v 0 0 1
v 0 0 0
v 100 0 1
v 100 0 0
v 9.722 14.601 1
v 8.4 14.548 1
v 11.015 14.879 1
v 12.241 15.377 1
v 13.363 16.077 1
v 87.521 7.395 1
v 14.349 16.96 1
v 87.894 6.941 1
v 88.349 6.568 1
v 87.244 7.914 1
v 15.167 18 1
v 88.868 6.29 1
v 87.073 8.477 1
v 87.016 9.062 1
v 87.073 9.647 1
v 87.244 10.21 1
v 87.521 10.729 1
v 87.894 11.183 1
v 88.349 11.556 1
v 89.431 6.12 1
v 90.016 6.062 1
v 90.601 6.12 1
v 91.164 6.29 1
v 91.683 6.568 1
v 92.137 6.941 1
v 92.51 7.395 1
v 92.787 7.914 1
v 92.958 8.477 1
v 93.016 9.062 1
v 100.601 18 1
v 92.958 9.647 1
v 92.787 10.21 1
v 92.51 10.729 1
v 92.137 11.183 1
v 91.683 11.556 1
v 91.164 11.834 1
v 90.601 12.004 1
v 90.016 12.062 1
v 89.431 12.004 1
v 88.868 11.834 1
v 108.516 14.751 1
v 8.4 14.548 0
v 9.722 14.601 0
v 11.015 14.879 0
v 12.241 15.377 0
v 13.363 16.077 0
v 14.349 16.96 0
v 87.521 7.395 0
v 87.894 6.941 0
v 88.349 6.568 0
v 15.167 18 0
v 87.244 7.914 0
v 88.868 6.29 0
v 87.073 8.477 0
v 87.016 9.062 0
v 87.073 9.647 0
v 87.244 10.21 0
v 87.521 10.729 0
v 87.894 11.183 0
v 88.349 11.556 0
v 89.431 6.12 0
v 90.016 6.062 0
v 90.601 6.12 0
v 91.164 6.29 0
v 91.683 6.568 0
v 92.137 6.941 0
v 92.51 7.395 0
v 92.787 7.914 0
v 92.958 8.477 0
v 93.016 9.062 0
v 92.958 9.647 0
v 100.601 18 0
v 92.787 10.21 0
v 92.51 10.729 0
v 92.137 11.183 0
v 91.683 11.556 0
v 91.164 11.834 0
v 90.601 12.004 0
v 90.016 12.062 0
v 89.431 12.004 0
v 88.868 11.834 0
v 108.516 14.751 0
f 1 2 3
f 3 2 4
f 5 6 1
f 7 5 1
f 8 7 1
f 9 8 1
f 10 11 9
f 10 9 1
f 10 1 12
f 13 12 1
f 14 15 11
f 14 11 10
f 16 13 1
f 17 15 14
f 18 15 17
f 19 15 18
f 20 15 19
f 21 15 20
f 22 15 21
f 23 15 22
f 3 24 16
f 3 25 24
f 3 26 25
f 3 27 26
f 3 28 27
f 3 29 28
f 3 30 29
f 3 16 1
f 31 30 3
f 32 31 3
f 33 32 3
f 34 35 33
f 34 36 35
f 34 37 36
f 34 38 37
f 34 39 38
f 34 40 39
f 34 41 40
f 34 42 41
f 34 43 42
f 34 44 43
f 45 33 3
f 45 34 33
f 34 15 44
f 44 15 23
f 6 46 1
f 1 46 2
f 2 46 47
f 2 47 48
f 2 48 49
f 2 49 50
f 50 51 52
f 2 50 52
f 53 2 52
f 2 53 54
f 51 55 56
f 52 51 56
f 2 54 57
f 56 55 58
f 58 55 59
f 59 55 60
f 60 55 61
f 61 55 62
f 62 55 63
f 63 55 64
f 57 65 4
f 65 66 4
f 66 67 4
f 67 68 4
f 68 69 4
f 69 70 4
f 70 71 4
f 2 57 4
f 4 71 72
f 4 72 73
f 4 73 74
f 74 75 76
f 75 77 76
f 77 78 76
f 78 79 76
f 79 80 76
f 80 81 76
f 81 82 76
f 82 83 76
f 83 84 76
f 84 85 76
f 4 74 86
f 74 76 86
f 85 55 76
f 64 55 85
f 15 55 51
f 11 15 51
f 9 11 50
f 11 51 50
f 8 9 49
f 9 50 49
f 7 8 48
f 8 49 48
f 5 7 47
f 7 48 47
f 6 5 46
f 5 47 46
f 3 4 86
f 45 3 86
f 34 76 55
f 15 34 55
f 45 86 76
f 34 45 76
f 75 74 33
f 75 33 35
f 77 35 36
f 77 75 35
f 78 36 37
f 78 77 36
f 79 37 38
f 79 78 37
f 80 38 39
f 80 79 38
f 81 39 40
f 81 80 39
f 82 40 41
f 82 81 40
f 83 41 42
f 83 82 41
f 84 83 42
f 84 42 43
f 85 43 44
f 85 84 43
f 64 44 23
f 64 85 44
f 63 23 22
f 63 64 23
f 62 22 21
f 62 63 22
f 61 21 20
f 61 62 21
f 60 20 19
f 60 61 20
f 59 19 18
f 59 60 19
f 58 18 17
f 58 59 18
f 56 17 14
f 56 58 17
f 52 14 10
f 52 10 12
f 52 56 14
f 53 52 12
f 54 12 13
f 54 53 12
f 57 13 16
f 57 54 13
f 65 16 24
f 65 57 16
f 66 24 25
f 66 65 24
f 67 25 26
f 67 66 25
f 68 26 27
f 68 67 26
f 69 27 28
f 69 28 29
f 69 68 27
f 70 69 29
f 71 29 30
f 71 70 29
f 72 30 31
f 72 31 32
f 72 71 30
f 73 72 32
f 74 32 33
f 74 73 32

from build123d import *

# Parameters (mm, degrees)
SKETCH1_R           = 3
BOSS_EXTRUDE1_DEPTH = 1


with BuildPart() as part:
    # Sketch1 → Boss-Extrude1 (new body)
    with BuildSketch(Plane.XY):
        with BuildLine():
            Line((8.399507831, 14.548374322), (0, 0))
            Line((0, 0), (100, 0))
            Line((100, 0), (108.516319797, 14.750698581))
            Line((108.516319797, 14.750698581), (100.60138269, 18))
            Line((100.60138269, 18), (15.167032503, 18))
            ThreePointArc((15.167032503, 18), (12.241054752, 15.376619242), (8.399507831, 14.548374322))
        make_face()
        with Locations((90.015809824, 9.06195858)):
            Circle(SKETCH1_R, mode=Mode.SUBTRACT)
    extrude(amount=BOSS_EXTRUDE1_DEPTH)


solid = part.part
